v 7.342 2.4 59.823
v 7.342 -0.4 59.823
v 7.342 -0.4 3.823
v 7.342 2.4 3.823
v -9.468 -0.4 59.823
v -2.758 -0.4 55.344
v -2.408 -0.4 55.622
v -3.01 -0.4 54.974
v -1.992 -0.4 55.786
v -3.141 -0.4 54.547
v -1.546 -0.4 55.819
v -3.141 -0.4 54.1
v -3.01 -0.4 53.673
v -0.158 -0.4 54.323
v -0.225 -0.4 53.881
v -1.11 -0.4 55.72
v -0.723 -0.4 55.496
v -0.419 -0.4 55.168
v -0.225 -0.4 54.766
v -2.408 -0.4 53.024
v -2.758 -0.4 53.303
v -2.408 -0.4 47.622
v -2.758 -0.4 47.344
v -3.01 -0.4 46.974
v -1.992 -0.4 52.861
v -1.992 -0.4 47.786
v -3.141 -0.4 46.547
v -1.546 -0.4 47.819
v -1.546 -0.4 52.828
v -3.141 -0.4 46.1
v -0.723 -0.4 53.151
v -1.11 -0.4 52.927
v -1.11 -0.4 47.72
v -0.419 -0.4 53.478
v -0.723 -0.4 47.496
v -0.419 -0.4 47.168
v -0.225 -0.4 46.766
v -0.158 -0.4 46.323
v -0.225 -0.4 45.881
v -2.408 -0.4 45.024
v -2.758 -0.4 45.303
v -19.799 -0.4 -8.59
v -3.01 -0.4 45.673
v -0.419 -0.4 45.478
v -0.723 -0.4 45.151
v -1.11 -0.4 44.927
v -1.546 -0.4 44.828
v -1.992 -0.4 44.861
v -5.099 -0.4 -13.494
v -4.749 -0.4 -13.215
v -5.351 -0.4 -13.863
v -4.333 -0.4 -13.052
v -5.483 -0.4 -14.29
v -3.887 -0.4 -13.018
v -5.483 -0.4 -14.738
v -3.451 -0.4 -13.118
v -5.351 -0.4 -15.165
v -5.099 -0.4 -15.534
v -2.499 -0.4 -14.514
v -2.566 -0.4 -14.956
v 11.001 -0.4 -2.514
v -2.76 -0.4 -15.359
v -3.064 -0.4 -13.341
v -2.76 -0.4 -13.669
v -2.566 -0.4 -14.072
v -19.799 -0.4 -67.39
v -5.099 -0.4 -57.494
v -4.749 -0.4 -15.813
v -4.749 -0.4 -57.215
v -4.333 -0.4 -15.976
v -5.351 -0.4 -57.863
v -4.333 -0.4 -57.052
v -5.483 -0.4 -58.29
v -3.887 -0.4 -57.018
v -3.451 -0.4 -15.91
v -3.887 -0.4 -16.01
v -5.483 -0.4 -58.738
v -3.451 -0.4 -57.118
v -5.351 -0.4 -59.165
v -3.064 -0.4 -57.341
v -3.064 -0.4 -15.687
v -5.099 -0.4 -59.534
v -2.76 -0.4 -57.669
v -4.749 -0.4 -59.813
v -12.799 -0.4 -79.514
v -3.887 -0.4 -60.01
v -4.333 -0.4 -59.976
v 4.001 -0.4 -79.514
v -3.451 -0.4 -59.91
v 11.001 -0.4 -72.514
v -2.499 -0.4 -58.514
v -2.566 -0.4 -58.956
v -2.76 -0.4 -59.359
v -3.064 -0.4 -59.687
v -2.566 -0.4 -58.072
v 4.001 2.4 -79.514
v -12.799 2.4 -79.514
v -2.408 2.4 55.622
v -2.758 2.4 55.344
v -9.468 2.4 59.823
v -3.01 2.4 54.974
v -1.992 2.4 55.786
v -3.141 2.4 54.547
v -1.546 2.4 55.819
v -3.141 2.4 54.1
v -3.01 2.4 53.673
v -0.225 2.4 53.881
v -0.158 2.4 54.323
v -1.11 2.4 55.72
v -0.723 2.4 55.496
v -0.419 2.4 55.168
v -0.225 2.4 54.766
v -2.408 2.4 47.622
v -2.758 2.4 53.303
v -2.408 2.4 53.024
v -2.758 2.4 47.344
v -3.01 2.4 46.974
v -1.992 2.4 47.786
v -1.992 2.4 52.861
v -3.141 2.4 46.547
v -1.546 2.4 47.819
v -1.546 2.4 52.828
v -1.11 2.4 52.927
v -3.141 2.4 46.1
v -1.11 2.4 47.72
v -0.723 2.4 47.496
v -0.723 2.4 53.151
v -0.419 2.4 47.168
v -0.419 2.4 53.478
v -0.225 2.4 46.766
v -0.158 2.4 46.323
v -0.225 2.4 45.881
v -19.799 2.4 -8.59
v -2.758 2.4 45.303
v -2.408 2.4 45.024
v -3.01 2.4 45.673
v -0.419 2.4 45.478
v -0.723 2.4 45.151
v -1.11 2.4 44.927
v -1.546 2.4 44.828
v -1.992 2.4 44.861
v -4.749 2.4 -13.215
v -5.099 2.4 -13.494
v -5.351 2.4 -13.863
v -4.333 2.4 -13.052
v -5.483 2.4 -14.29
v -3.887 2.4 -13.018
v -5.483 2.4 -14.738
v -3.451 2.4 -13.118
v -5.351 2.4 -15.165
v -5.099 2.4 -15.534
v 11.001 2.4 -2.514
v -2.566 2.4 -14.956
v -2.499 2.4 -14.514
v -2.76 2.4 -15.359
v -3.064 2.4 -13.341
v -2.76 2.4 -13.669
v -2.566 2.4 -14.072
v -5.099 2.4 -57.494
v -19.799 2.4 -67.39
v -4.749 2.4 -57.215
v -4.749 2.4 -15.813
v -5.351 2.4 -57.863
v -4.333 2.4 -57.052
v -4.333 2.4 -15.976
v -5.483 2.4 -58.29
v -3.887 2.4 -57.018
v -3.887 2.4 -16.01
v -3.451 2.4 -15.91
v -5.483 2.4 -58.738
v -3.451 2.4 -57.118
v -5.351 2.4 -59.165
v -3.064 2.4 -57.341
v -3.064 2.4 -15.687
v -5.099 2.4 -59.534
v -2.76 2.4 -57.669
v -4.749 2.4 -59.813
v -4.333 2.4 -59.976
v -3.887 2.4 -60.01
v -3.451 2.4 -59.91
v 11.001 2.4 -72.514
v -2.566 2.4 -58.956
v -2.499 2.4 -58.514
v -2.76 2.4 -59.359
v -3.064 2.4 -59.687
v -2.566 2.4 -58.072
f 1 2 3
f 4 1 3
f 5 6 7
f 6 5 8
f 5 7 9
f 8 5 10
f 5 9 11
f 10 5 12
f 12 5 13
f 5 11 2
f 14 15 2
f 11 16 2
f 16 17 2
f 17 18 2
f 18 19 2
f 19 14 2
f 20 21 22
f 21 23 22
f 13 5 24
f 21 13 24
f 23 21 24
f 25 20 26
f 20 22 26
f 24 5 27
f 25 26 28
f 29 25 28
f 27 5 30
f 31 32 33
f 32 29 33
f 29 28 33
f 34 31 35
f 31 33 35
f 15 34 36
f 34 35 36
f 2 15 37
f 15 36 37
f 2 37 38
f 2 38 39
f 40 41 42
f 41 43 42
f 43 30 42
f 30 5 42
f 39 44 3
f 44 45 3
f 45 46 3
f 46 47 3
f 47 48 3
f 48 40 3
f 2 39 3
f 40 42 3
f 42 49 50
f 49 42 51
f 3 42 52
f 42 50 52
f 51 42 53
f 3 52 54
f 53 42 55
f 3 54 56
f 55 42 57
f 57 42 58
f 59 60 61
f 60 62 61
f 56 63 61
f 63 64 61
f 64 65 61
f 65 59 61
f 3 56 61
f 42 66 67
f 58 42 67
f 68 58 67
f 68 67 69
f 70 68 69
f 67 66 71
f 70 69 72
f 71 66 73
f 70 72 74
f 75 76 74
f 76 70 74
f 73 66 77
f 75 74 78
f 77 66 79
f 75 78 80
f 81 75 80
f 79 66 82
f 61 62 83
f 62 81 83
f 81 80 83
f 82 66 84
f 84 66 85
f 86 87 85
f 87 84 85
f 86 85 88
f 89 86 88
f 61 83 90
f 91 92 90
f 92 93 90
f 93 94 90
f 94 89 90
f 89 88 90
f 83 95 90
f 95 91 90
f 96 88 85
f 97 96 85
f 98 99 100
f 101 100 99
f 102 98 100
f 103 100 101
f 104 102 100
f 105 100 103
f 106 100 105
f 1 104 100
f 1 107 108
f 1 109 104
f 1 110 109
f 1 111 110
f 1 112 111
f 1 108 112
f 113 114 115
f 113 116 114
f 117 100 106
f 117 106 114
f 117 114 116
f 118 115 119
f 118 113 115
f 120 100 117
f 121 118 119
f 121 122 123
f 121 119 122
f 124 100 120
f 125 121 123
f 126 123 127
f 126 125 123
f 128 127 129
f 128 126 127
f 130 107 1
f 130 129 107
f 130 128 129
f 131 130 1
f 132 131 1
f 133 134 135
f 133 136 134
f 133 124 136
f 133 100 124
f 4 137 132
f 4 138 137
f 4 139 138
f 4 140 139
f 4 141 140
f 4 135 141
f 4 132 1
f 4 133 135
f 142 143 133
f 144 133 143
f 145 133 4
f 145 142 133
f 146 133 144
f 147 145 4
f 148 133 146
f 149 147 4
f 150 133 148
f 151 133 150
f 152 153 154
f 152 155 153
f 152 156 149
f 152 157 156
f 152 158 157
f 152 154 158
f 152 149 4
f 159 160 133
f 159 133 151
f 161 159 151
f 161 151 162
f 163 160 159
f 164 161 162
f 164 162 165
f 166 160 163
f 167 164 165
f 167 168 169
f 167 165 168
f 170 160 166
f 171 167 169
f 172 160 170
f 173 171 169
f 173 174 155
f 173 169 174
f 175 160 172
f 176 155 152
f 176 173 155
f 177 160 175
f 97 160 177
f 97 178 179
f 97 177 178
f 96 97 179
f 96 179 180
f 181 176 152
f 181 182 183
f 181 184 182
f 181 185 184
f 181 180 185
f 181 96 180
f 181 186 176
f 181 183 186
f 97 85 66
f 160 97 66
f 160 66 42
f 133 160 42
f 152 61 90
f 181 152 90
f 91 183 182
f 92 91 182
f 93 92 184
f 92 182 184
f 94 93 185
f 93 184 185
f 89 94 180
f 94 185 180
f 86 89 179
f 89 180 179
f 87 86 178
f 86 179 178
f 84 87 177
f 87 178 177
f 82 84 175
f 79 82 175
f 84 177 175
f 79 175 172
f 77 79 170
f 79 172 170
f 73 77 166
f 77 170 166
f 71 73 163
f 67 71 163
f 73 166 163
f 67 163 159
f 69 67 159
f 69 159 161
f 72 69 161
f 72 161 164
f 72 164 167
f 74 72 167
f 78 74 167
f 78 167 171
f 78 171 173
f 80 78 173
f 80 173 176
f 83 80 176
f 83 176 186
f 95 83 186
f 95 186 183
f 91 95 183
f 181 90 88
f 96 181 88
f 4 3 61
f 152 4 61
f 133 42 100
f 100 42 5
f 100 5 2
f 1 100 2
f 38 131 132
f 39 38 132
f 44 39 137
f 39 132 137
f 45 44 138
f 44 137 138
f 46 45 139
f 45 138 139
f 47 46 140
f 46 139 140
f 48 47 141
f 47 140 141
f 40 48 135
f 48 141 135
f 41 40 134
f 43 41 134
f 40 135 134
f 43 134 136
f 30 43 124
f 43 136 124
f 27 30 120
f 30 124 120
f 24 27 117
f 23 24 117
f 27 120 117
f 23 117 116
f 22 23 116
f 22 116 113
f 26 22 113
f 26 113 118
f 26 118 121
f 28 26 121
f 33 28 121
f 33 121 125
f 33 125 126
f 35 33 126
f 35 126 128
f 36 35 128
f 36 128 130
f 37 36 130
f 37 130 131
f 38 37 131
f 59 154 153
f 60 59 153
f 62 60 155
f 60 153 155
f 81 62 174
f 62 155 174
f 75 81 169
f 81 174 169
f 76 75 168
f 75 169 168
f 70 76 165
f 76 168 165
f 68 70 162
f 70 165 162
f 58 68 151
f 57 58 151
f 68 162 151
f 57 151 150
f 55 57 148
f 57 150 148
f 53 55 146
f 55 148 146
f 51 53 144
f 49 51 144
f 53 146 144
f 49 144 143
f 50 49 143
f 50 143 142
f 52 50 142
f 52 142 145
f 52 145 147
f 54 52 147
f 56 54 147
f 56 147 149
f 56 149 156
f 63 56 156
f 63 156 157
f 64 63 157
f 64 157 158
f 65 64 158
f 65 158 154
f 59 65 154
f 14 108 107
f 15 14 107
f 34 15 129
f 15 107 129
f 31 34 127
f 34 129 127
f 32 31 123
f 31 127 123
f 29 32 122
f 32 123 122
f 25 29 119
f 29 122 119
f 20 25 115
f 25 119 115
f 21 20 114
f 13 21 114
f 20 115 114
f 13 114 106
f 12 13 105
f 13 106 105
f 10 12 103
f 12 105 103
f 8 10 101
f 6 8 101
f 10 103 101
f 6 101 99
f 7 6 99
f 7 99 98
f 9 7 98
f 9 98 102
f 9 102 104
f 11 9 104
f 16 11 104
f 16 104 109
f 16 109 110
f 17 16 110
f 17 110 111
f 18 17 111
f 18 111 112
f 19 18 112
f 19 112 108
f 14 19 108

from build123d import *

# Parameters (mm, degrees)
BOSS_EXTRUDE1_DEPTH = 2
SCALE1_SCALE        = 1.4
SKETCH2_R           = 1.5
CUT_EXTRUDE1_DEPTH  = 3.8
SKETCH3_R           = 1.5
CUT_EXTRUDE2_DEPTH  = 3.8


with BuildPart() as part:
    # Sketch1 → Boss-Extrude1 (new body)
    with BuildSketch(Plane(origin=(0, 0, 0), x_dir=(1, 0, 0), z_dir=(0, 1, 0))):
        Polygon((1.719047443, 61.234571581), (-10.280952557, 61.234571581), (-15.280952557, 52.574317544), (-15.280952557, 10.574317544), (-7.901694864, -38.292126086), (4.105557327, -38.292126086), (4.105557327, 1.707873914), (6.719047443, 6.234571581), (6.719047443, 56.234571581), align=None)
    extrude(amount=BOSS_EXTRUDE1_DEPTH)


with BuildPart() as part_1:
    # Scale1: scaled about (-3.98494468, 1, -15.536034959)
    add(part.part.scale(SCALE1_SCALE).moved(Location((1.593977872, -0.4, 6.214413984))))

    # Sketch2 → Cut-Extrude1 (cut, through all)
    with BuildSketch(Plane(origin=(0, 2.4, 0), x_dir=(1, 0, 0), z_dir=(0, 1, 0))):
        with Locations((-3.999355707, 14.51398623)):
            Circle(SKETCH2_R)
        with Locations((-3.999355707, 58.51398623)):
            Circle(SKETCH2_R)
    extrude(amount=-CUT_EXTRUDE1_DEPTH, mode=Mode.SUBTRACT)

    # Sketch3 → Cut-Extrude2 (cut, through all)
    with BuildSketch(Plane(origin=(0, 2.4, 0), x_dir=(1, 0, 0), z_dir=(0, 1, 0))):
        with Locations((-1.658241871, -46.323390503)):
            Circle(SKETCH3_R)
        with Locations((-1.658241871, -54.323390503)):
            Circle(SKETCH3_R)
    extrude(amount=-CUT_EXTRUDE2_DEPTH, mode=Mode.SUBTRACT)


solid = part_1.part
